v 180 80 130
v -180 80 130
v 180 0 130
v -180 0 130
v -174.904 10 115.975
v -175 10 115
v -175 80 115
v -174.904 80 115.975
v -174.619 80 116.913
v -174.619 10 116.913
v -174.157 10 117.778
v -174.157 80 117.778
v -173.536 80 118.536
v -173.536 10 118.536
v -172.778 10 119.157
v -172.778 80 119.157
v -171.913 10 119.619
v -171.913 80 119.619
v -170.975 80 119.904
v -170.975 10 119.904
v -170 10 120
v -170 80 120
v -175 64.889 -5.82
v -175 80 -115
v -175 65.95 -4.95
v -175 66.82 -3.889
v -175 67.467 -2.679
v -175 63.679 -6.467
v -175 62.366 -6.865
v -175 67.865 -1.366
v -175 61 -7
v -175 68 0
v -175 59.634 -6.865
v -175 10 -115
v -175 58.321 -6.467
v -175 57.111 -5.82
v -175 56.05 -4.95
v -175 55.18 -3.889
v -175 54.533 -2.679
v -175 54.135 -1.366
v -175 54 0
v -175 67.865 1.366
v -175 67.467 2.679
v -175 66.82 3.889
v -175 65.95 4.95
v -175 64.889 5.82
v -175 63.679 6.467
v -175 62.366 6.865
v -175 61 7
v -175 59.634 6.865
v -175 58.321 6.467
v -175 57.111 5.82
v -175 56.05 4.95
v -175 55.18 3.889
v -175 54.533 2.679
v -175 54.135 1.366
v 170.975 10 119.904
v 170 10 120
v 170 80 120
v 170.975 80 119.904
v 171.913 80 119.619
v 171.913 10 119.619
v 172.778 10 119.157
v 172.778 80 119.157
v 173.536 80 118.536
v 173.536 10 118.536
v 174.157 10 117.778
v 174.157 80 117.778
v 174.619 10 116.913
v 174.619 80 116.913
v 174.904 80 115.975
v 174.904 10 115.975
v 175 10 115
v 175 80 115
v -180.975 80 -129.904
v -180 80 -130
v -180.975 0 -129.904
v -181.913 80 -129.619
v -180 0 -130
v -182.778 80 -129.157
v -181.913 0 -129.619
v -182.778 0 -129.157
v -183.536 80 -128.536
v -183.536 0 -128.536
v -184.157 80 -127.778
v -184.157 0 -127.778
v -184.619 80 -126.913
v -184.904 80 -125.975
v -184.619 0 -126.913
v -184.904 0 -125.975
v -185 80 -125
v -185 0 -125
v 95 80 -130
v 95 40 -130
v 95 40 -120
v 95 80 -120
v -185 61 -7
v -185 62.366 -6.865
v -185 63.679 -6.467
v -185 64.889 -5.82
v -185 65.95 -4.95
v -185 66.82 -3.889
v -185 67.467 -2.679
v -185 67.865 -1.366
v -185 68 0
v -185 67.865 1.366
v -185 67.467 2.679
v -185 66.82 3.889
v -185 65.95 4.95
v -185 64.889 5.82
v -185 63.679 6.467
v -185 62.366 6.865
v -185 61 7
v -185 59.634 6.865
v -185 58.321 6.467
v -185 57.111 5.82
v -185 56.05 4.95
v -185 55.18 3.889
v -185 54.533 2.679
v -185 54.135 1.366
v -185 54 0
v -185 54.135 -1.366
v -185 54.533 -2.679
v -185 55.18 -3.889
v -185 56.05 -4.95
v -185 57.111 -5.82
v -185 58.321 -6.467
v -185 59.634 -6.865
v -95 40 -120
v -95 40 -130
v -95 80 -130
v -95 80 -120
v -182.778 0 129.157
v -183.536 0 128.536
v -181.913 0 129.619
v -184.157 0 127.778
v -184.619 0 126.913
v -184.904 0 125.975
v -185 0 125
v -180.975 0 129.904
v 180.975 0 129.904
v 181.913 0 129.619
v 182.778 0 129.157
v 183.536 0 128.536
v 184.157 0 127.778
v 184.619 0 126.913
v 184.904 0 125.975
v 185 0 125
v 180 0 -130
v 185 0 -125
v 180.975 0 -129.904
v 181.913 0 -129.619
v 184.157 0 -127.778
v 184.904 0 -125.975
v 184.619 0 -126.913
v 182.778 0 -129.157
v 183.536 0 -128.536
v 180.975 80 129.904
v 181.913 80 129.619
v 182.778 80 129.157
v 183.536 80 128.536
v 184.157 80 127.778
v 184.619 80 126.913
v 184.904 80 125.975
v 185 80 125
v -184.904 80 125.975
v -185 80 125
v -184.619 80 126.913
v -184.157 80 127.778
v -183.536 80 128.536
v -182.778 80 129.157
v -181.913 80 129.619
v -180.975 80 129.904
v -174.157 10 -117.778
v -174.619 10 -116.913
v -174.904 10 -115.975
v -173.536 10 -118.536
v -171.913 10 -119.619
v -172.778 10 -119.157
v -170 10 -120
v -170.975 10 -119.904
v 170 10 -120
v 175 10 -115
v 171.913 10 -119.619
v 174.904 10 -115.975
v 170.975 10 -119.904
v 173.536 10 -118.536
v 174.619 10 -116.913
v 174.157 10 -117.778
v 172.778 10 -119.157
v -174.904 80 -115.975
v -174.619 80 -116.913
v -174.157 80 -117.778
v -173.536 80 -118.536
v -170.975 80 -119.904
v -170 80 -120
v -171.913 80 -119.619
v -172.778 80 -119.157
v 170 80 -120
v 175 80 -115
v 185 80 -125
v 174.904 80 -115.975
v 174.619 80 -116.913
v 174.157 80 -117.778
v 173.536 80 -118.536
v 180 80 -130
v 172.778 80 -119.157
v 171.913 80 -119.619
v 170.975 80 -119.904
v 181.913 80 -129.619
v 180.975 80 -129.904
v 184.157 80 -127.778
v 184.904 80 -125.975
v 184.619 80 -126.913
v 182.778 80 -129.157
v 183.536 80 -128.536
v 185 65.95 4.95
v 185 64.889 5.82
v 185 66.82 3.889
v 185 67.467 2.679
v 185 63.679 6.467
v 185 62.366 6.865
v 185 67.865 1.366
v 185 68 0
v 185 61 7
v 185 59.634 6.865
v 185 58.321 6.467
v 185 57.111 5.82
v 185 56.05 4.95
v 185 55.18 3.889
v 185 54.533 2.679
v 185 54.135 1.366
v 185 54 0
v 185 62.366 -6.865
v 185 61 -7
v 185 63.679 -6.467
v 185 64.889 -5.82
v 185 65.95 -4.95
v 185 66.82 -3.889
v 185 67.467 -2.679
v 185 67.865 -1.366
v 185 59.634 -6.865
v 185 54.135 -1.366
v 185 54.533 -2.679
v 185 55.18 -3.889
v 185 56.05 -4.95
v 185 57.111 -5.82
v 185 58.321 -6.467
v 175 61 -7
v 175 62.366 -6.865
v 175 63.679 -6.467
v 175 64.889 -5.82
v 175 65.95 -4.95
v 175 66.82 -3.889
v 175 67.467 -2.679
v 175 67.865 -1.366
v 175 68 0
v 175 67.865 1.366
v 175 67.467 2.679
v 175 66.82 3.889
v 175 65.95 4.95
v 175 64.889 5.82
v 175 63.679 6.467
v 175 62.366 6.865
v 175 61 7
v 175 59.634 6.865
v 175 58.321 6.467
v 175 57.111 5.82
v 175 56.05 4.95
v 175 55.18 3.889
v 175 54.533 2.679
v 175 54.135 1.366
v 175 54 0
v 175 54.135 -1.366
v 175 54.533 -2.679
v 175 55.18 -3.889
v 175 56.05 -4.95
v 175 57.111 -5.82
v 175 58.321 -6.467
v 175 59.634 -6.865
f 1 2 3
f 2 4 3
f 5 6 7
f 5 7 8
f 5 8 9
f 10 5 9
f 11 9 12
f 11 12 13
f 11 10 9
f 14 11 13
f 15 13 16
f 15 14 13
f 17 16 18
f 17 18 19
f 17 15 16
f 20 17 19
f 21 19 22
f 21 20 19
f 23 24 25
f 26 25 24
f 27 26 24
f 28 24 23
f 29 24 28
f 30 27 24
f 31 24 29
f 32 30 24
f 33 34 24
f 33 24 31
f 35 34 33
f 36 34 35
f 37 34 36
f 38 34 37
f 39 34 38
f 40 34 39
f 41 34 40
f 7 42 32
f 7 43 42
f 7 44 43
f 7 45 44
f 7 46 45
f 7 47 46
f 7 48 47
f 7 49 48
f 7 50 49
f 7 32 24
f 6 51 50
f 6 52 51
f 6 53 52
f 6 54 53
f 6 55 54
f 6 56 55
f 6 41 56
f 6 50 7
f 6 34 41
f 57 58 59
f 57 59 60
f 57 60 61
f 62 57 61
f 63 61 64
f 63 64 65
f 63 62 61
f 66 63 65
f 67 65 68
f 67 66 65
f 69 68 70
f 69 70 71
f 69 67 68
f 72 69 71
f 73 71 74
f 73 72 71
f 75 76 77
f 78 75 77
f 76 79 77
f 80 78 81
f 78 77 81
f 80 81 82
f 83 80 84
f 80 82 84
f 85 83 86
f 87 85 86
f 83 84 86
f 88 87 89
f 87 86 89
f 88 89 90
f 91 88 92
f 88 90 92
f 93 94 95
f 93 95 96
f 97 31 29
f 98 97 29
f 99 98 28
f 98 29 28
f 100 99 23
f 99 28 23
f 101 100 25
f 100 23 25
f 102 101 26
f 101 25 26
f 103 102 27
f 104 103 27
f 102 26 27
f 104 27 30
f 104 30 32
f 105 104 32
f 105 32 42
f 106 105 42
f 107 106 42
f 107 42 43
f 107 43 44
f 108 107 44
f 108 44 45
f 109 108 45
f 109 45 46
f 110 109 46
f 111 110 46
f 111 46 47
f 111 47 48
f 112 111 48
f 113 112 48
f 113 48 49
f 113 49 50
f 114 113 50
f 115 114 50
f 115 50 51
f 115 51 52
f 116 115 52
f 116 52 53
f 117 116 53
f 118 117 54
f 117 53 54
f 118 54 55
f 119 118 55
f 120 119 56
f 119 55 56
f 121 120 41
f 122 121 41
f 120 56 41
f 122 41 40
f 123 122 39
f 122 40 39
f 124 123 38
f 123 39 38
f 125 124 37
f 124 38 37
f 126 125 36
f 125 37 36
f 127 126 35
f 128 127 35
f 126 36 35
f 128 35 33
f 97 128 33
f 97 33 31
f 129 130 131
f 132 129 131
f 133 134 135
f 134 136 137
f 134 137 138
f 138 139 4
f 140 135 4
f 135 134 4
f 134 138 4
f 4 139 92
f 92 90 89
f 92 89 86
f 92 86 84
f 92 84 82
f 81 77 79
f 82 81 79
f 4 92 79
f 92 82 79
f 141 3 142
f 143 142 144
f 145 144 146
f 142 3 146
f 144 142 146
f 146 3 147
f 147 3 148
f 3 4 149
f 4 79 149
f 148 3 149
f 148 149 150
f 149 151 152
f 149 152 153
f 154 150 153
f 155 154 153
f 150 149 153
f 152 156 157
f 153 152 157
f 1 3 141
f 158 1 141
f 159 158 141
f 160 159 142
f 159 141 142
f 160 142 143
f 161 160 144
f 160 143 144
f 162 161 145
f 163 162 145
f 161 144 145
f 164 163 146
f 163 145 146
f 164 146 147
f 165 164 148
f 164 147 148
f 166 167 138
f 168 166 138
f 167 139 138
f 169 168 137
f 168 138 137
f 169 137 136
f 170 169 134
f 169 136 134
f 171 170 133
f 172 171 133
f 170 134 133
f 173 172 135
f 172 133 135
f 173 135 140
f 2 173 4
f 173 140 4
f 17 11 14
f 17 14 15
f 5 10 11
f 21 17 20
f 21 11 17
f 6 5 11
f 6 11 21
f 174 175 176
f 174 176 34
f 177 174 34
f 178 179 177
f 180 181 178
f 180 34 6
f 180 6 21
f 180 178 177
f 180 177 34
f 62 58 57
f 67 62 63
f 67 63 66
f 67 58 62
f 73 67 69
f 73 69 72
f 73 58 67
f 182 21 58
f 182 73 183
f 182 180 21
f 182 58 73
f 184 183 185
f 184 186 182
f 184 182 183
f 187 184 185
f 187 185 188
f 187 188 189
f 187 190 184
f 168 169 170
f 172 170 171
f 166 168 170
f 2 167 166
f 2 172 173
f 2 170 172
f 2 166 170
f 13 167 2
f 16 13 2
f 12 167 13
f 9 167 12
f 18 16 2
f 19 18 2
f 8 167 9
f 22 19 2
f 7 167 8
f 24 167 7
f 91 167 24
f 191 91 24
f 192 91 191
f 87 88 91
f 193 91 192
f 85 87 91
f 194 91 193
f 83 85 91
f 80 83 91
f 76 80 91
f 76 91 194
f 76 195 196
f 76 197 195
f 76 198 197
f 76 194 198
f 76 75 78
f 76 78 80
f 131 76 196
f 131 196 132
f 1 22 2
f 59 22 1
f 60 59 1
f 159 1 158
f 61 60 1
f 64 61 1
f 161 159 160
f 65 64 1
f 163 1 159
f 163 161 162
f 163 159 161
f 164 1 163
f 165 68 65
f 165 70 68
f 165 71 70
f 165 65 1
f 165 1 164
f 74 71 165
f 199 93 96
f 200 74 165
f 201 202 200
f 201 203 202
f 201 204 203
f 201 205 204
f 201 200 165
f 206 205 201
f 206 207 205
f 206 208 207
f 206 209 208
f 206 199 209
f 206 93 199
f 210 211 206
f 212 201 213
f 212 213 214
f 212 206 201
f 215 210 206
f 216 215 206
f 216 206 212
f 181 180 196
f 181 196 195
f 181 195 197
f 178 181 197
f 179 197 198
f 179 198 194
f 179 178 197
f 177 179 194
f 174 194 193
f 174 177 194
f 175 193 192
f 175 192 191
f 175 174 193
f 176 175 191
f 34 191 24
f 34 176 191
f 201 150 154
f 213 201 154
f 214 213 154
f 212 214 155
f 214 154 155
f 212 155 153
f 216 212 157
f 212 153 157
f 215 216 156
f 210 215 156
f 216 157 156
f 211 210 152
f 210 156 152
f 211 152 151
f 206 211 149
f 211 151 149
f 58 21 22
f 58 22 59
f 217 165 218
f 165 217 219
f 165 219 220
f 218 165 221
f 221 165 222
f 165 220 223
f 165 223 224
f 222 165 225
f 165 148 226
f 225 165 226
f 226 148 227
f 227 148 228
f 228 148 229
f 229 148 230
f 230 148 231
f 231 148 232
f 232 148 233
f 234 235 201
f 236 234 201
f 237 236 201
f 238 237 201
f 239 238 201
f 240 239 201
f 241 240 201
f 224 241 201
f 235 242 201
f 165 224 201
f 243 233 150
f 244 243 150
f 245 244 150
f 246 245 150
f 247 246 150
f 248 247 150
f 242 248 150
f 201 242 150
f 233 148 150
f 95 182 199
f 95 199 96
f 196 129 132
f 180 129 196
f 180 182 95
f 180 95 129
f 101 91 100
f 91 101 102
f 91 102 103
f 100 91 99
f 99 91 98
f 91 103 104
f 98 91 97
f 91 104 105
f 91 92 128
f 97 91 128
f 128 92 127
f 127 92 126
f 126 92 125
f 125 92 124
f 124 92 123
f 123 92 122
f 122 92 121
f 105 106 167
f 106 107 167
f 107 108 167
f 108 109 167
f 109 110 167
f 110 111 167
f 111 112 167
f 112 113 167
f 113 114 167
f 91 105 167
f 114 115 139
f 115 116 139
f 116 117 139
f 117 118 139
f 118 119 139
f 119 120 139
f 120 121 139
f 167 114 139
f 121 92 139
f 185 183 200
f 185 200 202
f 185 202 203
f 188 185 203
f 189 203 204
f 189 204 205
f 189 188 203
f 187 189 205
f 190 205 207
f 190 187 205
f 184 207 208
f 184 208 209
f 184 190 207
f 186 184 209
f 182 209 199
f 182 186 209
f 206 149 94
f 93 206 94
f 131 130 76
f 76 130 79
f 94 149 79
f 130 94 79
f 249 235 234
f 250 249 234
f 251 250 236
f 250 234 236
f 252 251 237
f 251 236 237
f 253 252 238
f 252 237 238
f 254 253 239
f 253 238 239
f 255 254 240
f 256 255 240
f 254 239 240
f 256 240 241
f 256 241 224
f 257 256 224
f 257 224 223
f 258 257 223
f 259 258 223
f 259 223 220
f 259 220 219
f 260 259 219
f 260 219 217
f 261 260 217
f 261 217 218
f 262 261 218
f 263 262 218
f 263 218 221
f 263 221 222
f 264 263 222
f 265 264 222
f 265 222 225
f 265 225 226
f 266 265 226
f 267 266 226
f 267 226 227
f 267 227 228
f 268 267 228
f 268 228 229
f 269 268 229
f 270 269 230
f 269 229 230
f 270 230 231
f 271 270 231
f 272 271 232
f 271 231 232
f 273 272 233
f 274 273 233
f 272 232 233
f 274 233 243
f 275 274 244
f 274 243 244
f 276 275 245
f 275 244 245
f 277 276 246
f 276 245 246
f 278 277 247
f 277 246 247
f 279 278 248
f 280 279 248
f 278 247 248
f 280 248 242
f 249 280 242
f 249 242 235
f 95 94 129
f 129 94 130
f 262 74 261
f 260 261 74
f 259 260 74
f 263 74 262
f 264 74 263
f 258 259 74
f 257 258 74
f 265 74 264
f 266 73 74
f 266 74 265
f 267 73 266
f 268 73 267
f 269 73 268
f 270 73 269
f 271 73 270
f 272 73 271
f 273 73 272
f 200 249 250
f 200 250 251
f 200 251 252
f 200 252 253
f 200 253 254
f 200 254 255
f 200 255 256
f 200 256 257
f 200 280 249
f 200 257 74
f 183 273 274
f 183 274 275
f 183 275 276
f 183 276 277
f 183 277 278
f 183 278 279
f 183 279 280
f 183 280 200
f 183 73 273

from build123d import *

# Parameters (mm, degrees)
BOSS_EXTRUDE1_DEPTH = 10
BOSS_EXTRUDE2_DEPTH = 70
SKETCH5_W           = 190
SKETCH5_H           = 80
CUT_EXTRUDE1_DEPTH  = 70
SKETCH6_R           = 7
CUT_EXTRUDE2_DEPTH  = 401.249921924


with BuildPart() as part:
    # Sketch2 → Boss-Extrude1 (new body)
    with BuildSketch(Plane(origin=(0, 0, 0), x_dir=(1, 0, 0), z_dir=(0, 1, 0))):
        with BuildLine():
            Line((-180, -130), (180, -130))
            ThreePointArc((180, -130), (183.535533906, -128.535533906), (185, -125))
            Line((185, -125), (185, 125))
            ThreePointArc((185, 125), (183.535533906, 128.535533906), (180, 130))
            Line((180, 130), (-180, 130))
            ThreePointArc((-180, 130), (-183.535533906, 128.535533906), (-185, 125))
            Line((-185, 125), (-185, -125))
            ThreePointArc((-185, -125), (-183.535533906, -128.535533906), (-180, -130))
        make_face()
    extrude(amount=BOSS_EXTRUDE1_DEPTH)

    # Sketch3 → Boss-Extrude2 (add)
    with BuildSketch(Plane(origin=(0, 10, 0), x_dir=(1, 0, 0), z_dir=(0, 1, 0))):
        with BuildLine():
            Line((180, 130), (-180, 130))
            ThreePointArc((-180, 130), (-183.535533906, 128.535533906), (-185, 125))
            Line((-185, 125), (-185, -125))
            ThreePointArc((-185, -125), (-183.535533906, -128.535533906), (-180, -130))
            Line((-180, -130), (180, -130))
            ThreePointArc((180, -130), (183.535533906, -128.535533906), (185, -125))
            Line((185, -125), (185, 125))
            ThreePointArc((185, 125), (183.535533906, 128.535533906), (180, 130))
        make_face()
        with BuildLine():
            Line((170, 120), (-170, 120))
            ThreePointArc((-170, 120), (-173.535533906, 118.535533906), (-175, 115))
            Line((-175, 115), (-175, -115))
            ThreePointArc((-175, -115), (-173.535533906, -118.535533906), (-170, -120))
            Line((-170, -120), (170, -120))
            ThreePointArc((170, -120), (173.535533906, -118.535533906), (175, -115))
            Line((175, -115), (175, 115))
            ThreePointArc((175, 115), (173.535533906, 118.535533906), (170, 120))
        make_face(mode=Mode.SUBTRACT)
    extrude(amount=BOSS_EXTRUDE2_DEPTH)

    # Sketch5 → Cut-Extrude1 (cut)
    with BuildSketch(Plane(origin=(0, 0, -130), x_dir=(-1, 0, 0), z_dir=(0, 0, -1))):
        with Locations((0, 80)):
            Rectangle(SKETCH5_W, SKETCH5_H)
    extrude(amount=-CUT_EXTRUDE1_DEPTH, mode=Mode.SUBTRACT)

    # Sketch6 → Cut-Extrude2 (cut, through all)
    with BuildSketch(Plane(origin=(185, 0, 0), x_dir=(0, 0, -1), z_dir=(1, 0, 0))):
        with Locations((0, 61)):
            Circle(SKETCH6_R)
    extrude(amount=-CUT_EXTRUDE2_DEPTH, mode=Mode.SUBTRACT)


solid = part.part
